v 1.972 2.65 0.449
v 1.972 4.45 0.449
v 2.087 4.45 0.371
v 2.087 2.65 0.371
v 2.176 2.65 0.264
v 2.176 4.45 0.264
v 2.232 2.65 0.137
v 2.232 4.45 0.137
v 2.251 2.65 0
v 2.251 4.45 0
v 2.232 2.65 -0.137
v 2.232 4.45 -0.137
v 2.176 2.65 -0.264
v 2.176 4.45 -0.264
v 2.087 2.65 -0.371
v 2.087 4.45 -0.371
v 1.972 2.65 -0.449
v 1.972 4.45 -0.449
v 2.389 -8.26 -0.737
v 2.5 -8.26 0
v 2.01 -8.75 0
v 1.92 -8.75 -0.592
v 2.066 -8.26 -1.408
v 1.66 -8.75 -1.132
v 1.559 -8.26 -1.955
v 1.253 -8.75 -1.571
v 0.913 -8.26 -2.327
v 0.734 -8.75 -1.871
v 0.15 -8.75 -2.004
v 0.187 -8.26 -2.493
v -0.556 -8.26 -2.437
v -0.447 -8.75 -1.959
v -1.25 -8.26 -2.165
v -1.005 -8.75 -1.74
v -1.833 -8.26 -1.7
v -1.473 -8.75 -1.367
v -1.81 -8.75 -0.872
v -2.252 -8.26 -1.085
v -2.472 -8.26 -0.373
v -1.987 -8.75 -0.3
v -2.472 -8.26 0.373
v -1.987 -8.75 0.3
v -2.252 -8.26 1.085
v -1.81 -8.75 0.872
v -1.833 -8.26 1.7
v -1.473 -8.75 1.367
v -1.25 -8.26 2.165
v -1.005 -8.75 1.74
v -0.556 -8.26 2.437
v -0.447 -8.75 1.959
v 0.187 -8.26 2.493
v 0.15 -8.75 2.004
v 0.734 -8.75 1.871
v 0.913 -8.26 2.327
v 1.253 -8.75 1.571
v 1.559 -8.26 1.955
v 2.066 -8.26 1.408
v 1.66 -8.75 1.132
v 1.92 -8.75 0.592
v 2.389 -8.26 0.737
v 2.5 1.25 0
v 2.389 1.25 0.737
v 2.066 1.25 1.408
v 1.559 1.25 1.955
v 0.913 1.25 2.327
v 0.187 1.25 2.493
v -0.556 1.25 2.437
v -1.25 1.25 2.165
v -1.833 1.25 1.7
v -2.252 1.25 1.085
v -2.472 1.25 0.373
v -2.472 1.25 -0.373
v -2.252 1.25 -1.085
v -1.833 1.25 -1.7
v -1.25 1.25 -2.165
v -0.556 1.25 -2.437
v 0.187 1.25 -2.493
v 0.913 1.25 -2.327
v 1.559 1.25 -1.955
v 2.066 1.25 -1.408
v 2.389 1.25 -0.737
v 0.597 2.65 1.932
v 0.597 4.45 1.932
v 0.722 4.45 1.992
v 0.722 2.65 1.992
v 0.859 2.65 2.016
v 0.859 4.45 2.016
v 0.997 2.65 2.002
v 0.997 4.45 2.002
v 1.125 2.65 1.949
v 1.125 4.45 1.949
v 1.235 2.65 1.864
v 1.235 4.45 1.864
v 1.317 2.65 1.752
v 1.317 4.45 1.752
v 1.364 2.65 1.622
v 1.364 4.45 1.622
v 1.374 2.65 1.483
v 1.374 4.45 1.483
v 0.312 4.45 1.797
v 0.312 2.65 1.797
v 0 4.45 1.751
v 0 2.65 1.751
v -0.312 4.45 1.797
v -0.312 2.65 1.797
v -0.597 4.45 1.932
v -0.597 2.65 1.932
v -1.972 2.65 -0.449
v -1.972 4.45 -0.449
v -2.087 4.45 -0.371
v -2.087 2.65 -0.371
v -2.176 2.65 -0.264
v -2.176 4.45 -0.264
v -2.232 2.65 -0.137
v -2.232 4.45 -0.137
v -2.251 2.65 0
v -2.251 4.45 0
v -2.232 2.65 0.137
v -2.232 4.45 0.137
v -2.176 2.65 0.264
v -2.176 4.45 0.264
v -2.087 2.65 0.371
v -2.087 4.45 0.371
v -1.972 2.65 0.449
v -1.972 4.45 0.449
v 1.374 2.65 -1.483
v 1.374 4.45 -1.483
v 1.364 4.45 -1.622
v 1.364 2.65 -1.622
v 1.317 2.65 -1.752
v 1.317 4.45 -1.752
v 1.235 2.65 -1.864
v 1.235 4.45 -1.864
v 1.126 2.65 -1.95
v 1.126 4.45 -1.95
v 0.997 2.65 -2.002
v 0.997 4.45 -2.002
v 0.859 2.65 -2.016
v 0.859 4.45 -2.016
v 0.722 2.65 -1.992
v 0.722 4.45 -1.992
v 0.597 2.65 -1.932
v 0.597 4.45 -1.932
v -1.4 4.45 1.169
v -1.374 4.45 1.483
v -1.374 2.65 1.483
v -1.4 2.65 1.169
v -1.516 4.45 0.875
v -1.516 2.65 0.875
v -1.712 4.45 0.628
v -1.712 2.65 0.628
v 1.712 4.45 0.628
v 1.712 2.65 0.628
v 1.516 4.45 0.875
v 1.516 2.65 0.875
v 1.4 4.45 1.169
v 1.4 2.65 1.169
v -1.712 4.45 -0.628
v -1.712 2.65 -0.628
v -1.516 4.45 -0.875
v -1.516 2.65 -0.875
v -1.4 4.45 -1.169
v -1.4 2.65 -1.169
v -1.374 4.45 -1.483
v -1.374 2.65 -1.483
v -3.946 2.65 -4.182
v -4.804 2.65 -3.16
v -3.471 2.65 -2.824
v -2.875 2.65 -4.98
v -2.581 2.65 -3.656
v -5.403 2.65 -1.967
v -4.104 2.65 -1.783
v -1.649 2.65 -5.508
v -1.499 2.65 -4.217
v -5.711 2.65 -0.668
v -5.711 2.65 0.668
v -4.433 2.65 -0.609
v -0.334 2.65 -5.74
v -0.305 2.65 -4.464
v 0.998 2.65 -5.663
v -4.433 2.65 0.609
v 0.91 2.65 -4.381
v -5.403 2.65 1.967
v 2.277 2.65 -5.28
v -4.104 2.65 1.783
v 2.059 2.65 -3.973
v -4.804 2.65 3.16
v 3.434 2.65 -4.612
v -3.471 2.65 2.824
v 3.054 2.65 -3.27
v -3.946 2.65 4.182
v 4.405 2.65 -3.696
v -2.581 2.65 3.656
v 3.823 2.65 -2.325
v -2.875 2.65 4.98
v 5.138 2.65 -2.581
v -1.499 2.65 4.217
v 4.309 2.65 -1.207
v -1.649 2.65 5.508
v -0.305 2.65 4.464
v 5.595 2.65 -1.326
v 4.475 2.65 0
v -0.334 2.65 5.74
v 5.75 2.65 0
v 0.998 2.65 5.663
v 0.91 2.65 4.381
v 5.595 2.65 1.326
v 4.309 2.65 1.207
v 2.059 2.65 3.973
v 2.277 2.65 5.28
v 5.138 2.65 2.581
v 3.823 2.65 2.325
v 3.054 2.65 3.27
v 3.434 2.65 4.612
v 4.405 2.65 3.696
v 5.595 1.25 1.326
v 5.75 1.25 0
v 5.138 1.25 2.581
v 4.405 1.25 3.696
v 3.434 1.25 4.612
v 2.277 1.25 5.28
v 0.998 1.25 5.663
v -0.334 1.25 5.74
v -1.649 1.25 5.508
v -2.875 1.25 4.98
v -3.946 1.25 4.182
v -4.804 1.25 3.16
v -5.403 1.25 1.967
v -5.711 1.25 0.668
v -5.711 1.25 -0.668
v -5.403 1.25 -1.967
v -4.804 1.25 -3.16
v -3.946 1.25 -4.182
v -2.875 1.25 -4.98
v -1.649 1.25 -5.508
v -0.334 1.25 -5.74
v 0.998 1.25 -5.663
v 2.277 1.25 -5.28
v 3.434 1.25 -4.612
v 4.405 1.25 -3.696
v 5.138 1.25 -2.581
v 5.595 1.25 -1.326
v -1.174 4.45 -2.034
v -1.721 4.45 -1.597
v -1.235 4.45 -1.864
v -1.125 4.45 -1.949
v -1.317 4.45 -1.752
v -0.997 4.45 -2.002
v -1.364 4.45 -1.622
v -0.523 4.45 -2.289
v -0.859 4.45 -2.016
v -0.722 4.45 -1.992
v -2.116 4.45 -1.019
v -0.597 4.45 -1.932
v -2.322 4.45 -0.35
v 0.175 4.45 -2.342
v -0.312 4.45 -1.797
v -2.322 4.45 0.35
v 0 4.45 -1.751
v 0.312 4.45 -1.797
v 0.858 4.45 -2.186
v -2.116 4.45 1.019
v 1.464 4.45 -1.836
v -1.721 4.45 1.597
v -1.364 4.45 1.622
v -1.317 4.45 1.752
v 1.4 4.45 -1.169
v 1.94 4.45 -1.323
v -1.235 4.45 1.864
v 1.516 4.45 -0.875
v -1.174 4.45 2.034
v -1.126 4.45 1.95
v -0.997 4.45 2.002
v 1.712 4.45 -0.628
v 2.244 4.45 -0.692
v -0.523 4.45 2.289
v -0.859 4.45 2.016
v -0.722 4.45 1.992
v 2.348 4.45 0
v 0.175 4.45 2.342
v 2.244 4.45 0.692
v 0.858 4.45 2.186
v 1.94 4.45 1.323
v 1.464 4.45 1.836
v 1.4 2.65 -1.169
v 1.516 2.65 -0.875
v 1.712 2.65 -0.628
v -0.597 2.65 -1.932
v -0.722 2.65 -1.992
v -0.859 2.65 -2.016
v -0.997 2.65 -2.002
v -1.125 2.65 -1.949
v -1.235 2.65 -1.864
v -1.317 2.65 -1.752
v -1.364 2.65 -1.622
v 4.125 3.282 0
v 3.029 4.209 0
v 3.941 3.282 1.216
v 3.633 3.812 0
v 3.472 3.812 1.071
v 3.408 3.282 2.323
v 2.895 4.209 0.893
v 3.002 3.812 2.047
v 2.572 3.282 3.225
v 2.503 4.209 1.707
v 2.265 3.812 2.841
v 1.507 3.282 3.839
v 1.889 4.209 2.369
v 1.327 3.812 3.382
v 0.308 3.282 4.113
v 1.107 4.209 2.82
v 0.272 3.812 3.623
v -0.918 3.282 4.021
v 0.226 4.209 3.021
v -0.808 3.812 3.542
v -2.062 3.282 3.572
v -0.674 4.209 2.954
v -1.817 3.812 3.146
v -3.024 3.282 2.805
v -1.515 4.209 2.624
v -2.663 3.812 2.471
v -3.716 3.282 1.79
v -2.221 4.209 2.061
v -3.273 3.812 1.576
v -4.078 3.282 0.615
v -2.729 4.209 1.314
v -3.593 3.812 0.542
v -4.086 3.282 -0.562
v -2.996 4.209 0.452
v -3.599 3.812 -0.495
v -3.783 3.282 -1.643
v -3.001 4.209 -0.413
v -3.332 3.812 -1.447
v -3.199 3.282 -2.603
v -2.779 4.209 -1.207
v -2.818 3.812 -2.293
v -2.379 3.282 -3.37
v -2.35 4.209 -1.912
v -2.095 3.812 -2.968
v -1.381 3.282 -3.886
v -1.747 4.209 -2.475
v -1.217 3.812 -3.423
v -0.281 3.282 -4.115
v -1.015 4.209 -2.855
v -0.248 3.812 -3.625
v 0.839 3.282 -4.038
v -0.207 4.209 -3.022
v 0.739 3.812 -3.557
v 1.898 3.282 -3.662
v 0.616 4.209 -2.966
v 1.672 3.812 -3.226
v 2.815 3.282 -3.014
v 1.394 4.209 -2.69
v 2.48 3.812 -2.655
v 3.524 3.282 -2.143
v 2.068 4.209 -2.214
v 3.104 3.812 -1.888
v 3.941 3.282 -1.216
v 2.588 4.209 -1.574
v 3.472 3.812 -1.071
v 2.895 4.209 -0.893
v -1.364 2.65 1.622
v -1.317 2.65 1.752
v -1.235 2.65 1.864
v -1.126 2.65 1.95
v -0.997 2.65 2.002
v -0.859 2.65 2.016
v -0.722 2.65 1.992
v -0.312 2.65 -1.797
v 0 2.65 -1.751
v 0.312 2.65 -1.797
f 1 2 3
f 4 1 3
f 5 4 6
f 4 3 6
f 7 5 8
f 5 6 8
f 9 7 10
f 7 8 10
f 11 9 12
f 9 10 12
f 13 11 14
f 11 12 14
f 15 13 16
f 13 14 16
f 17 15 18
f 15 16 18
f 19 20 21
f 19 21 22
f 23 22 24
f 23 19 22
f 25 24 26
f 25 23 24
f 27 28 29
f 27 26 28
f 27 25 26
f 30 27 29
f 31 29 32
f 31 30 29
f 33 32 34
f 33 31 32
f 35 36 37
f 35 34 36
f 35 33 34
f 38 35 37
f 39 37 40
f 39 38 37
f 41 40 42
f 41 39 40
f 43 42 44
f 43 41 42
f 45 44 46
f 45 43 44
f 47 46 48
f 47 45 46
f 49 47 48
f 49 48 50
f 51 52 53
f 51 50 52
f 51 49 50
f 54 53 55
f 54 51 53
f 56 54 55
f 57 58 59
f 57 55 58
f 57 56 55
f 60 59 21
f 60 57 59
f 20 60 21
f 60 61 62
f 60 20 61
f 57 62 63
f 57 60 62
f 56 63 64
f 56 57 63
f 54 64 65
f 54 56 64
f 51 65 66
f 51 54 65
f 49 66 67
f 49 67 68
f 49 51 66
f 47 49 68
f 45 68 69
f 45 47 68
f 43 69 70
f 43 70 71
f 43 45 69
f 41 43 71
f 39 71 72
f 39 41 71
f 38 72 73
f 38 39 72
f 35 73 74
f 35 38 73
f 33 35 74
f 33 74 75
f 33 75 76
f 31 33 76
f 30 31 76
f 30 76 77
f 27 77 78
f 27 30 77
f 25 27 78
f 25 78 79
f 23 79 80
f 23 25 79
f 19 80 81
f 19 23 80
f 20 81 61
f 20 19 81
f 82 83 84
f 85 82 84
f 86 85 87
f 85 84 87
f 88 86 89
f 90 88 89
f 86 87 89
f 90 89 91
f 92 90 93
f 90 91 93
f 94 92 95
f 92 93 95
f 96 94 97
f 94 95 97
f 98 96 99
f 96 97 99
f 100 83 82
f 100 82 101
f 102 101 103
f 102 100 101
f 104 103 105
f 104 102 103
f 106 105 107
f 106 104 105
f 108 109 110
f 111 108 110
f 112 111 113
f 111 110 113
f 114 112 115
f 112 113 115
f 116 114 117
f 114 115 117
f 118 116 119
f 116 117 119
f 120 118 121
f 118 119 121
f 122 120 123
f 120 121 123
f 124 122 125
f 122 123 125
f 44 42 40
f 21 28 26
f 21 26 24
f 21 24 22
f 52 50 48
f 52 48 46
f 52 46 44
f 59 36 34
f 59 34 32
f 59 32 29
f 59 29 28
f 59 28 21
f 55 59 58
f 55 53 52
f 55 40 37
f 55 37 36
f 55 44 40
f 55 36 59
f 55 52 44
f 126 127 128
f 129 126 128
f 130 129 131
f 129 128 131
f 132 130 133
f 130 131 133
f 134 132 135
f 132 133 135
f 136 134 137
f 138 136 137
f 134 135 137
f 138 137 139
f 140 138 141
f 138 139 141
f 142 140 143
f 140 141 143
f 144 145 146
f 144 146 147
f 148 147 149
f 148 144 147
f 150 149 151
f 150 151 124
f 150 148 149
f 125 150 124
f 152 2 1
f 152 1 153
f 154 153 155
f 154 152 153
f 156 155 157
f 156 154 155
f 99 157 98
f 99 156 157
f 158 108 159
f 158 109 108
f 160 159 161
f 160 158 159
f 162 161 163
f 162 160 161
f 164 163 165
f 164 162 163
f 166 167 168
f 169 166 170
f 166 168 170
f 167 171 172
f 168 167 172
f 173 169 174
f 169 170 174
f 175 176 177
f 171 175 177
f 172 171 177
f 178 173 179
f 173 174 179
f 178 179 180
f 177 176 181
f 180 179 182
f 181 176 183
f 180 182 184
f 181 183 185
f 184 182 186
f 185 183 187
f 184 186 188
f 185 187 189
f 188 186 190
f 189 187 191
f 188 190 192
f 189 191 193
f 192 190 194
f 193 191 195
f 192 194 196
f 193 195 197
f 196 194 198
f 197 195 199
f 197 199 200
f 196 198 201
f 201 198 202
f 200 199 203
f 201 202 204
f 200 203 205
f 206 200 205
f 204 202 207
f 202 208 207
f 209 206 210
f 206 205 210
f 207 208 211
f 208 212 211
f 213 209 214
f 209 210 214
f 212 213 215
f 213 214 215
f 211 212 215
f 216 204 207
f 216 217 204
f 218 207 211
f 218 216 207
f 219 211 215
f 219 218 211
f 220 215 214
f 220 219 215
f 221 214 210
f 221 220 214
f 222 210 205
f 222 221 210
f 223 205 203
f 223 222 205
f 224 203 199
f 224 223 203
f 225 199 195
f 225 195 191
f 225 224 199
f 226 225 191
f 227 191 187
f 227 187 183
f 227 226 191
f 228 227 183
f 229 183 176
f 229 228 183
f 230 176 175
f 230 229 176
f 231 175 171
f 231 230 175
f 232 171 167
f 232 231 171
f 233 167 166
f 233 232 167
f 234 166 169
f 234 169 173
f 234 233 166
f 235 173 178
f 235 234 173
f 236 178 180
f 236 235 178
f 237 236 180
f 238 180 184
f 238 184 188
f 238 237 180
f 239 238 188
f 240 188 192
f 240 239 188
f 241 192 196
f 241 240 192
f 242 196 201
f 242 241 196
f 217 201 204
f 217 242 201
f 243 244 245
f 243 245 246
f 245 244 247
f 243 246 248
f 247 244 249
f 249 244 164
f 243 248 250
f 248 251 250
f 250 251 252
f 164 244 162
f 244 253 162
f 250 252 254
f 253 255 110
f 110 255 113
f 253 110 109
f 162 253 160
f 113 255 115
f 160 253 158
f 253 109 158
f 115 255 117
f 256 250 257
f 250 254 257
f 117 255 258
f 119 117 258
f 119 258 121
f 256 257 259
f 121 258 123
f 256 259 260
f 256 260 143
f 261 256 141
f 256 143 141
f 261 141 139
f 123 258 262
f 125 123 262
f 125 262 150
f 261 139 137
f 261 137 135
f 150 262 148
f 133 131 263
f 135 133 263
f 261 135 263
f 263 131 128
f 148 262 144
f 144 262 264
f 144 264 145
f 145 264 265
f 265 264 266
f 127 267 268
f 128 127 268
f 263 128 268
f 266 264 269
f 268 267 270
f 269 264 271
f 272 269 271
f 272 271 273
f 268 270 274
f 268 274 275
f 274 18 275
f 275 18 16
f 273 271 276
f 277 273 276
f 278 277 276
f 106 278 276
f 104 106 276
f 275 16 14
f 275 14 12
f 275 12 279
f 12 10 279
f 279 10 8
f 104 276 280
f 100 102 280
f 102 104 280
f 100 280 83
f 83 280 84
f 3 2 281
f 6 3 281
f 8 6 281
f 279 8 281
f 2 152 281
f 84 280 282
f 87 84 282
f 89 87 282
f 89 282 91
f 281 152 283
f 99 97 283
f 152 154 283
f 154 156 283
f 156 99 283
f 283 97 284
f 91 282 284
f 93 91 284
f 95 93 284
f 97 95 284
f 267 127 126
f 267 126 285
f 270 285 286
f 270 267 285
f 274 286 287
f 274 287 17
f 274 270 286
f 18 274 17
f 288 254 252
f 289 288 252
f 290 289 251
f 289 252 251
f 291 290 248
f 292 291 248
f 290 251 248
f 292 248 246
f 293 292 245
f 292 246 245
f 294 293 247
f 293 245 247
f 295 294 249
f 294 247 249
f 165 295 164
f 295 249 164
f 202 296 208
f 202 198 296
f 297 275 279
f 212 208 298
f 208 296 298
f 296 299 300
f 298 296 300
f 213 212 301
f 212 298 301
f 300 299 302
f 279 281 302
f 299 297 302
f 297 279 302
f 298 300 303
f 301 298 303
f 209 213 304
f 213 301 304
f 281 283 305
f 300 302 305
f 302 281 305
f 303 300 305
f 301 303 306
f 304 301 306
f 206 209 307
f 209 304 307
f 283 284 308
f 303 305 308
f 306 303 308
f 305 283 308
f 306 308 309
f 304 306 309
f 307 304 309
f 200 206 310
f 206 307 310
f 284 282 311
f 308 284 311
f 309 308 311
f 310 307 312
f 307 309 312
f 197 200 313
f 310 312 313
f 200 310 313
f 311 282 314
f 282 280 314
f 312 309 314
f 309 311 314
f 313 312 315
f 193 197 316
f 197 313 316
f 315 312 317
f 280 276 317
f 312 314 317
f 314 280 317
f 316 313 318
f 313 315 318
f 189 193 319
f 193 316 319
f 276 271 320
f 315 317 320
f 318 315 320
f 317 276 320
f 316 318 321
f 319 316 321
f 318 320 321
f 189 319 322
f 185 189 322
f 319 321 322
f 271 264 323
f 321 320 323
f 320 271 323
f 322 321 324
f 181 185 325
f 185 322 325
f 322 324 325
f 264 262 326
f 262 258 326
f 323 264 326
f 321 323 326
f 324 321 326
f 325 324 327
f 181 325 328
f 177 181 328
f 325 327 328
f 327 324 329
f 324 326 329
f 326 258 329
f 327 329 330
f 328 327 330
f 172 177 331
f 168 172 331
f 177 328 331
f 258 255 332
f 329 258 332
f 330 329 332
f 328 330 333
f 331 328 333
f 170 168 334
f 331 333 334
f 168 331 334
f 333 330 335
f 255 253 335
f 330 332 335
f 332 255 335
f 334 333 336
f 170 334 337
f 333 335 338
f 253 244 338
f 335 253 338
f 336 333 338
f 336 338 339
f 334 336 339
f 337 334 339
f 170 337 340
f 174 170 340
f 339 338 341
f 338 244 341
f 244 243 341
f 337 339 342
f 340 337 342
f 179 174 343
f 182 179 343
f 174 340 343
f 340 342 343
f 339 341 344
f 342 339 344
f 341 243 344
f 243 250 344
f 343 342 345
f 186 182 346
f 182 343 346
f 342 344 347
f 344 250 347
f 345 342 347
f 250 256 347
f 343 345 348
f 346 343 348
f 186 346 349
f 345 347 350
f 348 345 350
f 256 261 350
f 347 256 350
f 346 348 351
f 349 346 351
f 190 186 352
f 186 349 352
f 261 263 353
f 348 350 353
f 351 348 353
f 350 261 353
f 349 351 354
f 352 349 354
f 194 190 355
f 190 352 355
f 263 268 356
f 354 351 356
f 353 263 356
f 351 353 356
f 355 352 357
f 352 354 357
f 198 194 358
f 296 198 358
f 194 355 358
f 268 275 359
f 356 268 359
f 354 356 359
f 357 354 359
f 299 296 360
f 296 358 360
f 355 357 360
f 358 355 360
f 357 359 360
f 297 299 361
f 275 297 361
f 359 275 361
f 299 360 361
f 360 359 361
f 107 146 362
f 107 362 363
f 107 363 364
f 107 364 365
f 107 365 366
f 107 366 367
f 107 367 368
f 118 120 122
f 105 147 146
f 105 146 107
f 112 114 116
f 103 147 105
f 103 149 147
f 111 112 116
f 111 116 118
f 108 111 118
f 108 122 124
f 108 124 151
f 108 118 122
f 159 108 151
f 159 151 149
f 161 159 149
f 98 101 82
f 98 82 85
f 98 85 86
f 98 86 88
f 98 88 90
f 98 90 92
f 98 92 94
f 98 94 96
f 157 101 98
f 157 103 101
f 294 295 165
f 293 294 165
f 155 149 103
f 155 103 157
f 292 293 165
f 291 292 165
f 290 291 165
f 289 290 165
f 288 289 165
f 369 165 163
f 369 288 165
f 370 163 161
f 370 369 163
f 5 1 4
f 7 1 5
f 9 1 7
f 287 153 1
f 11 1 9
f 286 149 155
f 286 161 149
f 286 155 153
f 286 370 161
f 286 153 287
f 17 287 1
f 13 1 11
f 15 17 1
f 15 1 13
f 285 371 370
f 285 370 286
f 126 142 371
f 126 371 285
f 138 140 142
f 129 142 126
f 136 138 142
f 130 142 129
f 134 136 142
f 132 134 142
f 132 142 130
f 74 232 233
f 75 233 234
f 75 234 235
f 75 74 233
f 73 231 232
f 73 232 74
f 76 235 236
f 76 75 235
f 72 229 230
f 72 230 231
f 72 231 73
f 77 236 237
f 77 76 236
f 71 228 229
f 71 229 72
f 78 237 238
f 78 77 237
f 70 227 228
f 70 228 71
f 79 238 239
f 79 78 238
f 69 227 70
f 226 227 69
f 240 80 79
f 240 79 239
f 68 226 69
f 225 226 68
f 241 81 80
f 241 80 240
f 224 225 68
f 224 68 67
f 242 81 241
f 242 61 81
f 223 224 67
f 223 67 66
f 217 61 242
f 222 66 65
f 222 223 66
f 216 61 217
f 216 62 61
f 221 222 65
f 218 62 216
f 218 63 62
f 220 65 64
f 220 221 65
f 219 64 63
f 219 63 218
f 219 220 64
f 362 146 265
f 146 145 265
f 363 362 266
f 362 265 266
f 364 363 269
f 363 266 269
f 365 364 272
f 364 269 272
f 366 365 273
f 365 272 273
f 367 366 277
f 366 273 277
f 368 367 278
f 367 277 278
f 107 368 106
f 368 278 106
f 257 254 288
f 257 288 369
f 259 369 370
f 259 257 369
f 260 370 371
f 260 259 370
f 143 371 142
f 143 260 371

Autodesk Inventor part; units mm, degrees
sketch "Sketch_3" plane through (0, 0, 0) normal (0, 0, 1) x (1, 0, 0)
  line L0 (0, -8.75) -> (0, 4.45)
  line L1 (0, 4.45) -> (2.3483, 4.45)
  arc A0 (4.4749, 2.65) -> (2.3483, 4.45) centre (1.695, 1.522) ccw
  line L2 (4.4749, 2.65) -> (5.75, 2.65)
  line L3 (5.75, 2.65) -> (5.75, 1.25)
  line L4 (5.75, 1.25) -> (2.5, 1.25)
  line L5 (2.5, 1.25) -> (2.5, -8.2595)
  line L6 (2.5, -8.2595) -> (2.0095, -8.75)
  line L7 (2.0095, -8.75) -> (0, -8.75)
  line L8 (0, -8.75) -> (0, 4.45)
revolve "Revolution1" add sketch "Sketch_3" angle 360 about axis through (0, -8.75, 0) along (0, -1, 0)
thread "Thread1" size "M5x0.8" class "6g" standard "ISO Metric profile" length 8.2595
sketch "Sketch_1" plane through (0, 4.45, 0) normal (0, 1, 0) x (1, 0, 0)
  arc A0 (-1.9719, 0.4486) -> (-1.9719, -0.4486) centre (-1.7511, 0) ccw
  arc A1 (-1.3744, -1.4834) -> (-1.9719, -0.4486) centre (-2.4461, -1.4123) ccw
  arc A2 (-1.3744, -1.4834) -> (-0.5974, -1.932) centre (-0.8755, -1.5165) ccw
  arc A3 (0.5974, -1.932) -> (-0.5974, -1.932) centre (0, -2.8245) ccw
  arc A4 (0.5974, -1.932) -> (1.3744, -1.4834) centre (0.8755, -1.5165) ccw
  arc A5 (1.9719, -0.4486) -> (1.3744, -1.4834) centre (2.4461, -1.4123) ccw
  arc A6 (1.9719, -0.4486) -> (1.9719, 0.4486) centre (1.7511, 0) ccw
  arc A7 (1.3744, 1.4834) -> (1.9719, 0.4486) centre (2.4461, 1.4123) ccw
  arc A8 (1.3744, 1.4834) -> (0.5974, 1.932) centre (0.8755, 1.5165) ccw
  arc A9 (-0.5974, 1.932) -> (0.5974, 1.932) centre (0, 2.8245) ccw
  arc A10 (-0.5974, 1.932) -> (-1.3744, 1.4834) centre (-0.8755, 1.5165) ccw
  arc A11 (-1.9719, 0.4486) -> (-1.3744, 1.4834) centre (-2.4461, 1.4123) ccw
extrude "Extrusion1" cut sketch "Sketch_1" against normal blind 1.8
ref_plane "Bolt_XY" through (0, 1.25, 0) normal (0, 1, 0) x (1, 0, 0)
ref_plane "Bolt_YZ" through (0, 1.25, 0) normal (1, 0, 0) x (0, 0, -1)
ref_plane "Bolt_ZX" through (0, 1.25, 0) normal (0, 0, -1) x (0, 1, 0)
properties part number "0000-00082819_P2"
